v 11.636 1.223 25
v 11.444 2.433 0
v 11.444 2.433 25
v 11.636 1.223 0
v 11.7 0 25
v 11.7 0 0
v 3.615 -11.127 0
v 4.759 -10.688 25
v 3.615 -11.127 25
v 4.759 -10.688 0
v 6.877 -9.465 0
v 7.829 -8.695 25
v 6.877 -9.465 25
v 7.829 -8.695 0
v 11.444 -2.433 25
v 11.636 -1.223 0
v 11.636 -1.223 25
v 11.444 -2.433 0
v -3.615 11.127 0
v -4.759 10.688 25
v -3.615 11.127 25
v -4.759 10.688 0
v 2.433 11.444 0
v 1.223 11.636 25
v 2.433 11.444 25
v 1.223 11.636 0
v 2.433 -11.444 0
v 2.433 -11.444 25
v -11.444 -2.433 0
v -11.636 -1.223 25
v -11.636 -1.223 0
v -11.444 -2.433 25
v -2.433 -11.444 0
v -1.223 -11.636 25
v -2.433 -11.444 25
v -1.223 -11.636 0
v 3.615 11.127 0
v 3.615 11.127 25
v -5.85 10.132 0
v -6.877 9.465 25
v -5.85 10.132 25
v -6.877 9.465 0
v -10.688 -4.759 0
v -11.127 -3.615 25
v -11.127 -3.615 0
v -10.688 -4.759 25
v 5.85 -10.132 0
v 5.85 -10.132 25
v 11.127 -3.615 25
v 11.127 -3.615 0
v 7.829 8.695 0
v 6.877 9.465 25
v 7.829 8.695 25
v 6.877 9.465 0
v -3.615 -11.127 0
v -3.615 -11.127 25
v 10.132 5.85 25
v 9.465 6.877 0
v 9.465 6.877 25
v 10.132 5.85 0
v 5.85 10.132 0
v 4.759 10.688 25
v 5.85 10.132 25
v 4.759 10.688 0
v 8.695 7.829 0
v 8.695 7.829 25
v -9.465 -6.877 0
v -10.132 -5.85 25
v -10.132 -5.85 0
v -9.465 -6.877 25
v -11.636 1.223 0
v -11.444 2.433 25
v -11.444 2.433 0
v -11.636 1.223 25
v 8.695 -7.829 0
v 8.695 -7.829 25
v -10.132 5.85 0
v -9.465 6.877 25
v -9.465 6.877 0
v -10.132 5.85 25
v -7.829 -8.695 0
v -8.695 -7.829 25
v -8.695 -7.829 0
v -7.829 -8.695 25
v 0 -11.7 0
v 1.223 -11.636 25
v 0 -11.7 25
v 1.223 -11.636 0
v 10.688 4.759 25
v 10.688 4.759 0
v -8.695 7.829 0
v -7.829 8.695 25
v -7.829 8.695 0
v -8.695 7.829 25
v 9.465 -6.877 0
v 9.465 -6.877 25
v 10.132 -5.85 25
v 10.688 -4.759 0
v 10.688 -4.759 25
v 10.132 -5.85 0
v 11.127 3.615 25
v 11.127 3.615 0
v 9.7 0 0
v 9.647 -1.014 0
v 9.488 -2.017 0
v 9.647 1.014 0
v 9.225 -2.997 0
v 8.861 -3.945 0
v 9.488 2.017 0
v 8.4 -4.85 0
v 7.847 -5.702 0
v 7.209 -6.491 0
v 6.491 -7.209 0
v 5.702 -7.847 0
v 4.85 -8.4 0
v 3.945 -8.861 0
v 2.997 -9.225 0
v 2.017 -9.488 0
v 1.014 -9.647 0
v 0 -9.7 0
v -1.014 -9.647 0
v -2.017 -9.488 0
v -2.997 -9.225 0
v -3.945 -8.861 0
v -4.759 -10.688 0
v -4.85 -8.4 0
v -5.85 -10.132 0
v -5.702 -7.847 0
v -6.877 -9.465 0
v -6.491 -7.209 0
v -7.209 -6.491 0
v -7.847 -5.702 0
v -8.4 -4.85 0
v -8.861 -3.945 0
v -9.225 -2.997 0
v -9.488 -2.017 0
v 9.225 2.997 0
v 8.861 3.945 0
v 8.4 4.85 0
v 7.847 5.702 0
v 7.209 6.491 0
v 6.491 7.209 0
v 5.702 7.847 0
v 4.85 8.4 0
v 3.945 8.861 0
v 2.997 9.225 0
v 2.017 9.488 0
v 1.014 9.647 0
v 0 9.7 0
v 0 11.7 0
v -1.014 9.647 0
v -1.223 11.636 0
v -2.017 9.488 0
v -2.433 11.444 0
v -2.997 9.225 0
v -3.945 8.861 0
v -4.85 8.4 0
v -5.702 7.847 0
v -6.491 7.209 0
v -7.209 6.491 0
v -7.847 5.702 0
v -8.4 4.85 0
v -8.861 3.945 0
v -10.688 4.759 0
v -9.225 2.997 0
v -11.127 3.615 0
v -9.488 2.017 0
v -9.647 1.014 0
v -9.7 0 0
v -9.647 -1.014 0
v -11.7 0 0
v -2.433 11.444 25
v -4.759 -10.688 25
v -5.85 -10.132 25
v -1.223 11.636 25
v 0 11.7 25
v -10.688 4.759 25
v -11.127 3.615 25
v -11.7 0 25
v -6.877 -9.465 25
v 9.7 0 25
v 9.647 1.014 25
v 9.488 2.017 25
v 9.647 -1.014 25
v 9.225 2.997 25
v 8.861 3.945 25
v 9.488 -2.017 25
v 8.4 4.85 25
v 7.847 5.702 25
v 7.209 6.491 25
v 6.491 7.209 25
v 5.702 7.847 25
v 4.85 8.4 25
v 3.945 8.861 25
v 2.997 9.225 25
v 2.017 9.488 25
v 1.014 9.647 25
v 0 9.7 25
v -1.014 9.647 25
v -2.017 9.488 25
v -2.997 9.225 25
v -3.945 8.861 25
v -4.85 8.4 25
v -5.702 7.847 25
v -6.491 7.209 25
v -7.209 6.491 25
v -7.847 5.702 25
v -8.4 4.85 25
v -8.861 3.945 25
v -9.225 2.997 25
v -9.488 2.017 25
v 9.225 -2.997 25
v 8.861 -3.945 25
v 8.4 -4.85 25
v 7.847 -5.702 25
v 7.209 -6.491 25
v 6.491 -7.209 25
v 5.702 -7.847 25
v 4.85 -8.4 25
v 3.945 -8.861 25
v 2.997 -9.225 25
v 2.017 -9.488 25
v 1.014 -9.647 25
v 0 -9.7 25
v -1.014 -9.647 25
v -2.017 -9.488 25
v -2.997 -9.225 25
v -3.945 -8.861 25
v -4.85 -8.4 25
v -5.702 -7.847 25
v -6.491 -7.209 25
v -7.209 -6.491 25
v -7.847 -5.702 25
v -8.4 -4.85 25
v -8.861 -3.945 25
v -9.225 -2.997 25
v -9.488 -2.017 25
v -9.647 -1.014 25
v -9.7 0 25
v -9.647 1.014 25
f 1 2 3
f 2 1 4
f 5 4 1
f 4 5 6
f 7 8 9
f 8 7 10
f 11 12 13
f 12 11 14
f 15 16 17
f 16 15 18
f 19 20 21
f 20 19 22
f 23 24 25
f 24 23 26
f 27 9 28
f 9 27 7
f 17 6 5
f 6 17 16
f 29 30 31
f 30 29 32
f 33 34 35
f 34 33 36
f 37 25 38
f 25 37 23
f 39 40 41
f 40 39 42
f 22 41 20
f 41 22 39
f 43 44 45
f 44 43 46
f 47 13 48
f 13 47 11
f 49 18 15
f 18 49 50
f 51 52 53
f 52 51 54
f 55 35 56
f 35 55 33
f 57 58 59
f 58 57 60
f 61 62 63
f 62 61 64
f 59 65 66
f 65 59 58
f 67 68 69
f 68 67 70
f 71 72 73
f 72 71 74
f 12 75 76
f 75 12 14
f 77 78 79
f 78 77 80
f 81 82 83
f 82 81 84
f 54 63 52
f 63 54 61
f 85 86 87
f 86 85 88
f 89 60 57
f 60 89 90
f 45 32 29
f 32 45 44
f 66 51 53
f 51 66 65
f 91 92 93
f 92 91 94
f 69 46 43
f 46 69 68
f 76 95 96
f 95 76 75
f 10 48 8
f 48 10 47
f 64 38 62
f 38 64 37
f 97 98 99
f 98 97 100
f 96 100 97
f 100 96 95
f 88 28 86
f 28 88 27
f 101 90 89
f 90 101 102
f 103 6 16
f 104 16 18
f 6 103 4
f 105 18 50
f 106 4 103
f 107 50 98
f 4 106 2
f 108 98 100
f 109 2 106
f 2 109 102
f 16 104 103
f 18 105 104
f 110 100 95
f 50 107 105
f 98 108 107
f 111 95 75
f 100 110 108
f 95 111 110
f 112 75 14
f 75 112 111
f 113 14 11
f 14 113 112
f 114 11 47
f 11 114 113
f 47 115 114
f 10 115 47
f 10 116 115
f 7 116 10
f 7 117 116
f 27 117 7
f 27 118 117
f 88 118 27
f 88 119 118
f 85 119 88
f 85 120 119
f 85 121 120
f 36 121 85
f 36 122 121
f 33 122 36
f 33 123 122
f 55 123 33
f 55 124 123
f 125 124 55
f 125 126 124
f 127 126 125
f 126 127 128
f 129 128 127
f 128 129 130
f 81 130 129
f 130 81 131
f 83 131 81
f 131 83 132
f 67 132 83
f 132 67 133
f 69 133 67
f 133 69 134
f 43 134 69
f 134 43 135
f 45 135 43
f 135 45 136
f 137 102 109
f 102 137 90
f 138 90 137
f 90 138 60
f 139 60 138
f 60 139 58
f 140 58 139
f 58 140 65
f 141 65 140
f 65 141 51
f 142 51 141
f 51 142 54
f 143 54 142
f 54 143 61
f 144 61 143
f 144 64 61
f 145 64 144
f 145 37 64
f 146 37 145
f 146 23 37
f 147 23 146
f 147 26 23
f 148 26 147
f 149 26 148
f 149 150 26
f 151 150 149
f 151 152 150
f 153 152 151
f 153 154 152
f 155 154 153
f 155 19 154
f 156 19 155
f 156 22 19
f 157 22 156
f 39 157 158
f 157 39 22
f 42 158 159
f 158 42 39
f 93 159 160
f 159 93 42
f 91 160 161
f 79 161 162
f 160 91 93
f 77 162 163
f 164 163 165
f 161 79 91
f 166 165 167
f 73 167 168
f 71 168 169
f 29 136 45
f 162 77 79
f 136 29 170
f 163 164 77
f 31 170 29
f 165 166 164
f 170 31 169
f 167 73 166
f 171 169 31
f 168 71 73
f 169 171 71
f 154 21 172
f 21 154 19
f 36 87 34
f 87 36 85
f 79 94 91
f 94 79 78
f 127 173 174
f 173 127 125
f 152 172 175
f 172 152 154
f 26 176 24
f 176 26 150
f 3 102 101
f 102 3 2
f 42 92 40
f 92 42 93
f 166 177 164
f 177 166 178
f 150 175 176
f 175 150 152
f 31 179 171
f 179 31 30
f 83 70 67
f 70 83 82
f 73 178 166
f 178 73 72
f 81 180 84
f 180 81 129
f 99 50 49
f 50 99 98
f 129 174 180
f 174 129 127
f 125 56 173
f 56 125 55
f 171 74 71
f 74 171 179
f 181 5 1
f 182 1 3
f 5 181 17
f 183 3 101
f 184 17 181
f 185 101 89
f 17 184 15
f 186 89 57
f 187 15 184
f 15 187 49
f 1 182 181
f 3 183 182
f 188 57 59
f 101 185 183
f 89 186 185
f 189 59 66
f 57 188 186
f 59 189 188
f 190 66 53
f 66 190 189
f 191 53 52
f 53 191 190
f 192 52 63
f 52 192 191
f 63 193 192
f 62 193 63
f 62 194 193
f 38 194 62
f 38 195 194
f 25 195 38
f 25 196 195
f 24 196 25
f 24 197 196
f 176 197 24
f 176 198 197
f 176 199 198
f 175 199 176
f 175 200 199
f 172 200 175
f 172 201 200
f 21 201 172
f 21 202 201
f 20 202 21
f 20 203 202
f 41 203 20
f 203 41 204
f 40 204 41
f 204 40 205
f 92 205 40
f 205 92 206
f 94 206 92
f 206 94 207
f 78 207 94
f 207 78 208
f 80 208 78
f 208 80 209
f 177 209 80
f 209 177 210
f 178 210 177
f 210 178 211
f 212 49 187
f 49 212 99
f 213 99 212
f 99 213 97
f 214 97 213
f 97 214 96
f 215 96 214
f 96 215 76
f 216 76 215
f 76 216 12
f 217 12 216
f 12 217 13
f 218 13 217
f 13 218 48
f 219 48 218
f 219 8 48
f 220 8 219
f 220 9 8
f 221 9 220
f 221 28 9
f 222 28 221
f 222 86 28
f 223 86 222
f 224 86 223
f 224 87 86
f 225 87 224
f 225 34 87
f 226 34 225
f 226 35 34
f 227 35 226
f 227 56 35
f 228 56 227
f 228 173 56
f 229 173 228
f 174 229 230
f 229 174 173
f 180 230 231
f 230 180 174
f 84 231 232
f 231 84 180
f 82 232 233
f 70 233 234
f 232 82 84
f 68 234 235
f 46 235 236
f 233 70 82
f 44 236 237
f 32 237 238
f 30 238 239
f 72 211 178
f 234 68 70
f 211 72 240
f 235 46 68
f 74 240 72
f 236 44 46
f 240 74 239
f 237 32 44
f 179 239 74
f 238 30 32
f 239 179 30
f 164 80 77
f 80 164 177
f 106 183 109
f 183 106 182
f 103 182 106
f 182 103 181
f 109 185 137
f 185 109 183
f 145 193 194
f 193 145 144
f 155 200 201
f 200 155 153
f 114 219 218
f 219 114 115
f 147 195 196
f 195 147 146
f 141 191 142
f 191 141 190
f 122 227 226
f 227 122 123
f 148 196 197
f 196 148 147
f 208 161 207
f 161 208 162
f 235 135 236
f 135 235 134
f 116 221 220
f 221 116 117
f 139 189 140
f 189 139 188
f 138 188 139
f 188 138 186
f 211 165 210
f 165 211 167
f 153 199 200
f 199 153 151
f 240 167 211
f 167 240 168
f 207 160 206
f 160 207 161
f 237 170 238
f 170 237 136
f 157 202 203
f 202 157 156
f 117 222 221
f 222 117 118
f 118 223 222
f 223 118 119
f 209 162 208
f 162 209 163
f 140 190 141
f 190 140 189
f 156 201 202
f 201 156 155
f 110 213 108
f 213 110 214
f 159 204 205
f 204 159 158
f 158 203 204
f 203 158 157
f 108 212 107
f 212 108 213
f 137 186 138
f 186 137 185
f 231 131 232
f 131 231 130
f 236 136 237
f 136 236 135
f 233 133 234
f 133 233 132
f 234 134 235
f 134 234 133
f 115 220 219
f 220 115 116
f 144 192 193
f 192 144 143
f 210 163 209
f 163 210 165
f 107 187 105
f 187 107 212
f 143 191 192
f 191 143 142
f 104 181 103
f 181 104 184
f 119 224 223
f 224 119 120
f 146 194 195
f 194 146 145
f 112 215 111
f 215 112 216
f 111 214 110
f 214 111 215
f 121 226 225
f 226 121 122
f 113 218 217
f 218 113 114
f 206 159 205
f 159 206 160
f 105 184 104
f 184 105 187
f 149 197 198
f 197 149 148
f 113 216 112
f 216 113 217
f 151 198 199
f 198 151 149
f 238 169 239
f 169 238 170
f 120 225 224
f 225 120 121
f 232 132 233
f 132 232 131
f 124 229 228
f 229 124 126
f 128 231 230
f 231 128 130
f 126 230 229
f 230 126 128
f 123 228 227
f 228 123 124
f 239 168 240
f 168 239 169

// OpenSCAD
$fn=60;
//axle();
//knob();

//spool(20, 8, 3.3, 1);

//plate();
//pen_holder();
//pulley_clamp();
//carriage();
//plate_clamp();
//carriage2();
//pen_holder2();
pen_guide_extension();
//pen_guide_adaptor();

module carriage2() {
        disk_r = 55;
        disk_t = 2;
        disk_rim = 6;
        disk_spokes_w = 6;
        disk_spokes_n = 3;
        pen_guide_r = 9.7;
        pen_guide_t = 2;
        pen_guide_h = 20+disk_t;
        inner_disk_r = pen_guide_r+pen_guide_t+2;
        mount_w = 31;
        mount_l = 18;
        mount_dist = pen_guide_r+pen_guide_t+20;
        groove_depth = 0.6;
        groove_kerf = 2;
        groove_h = pen_guide_h*0.85;

        difference() {
                cylinder(r=disk_r, h=disk_t);
                cylinder(r=disk_r-disk_rim, h=disk_t);
        }

        difference() {
                union() {
                        for (i=[0:disk_spokes_n-1])
                                rotate([0, 0, i*360/disk_spokes_n])
                                        translate([0, (disk_r-disk_rim/2)/2, disk_t/2])
                                                cube([disk_spokes_w, disk_r-disk_rim/2, disk_t], center=true);
                        cylinder(r=inner_disk_r, h=disk_t);
                        cylinder(r=pen_guide_r+pen_guide_t,h=pen_guide_h);
                }
                union() {
                        cylinder(r=pen_guide_r, h=pen_guide_h);
                        translate([0, 0, groove_h]) difference() {
                                cylinder(r=pen_guide_r+pen_guide_t, h=groove_kerf, center=true);
                                cylinder(r=pen_guide_r+pen_guide_t-groove_depth, h=groove_kerf, center=true);
                        }
                }
        }
        
        translate([mount_w/2, mount_l+mount_dist, 0])
                rotate([0, 0, 180]) servo_mount();

}

module pen_guide_extension() {
	pen_guide_r = 9.7;
	pen_guide_t = 2;
	pen_guide_h = 25;
	
	difference() {
		cylinder(r=pen_guide_r+pen_guide_t, h=pen_guide_h);
		cylinder(r=pen_guide_r, h=pen_guide_h);
	}
}

module pen_guide_adaptor() {
	or = 9.4;
	ir = 6.4;
	length = 32;
	gap = 2;

	difference() {
		cylinder(r=or, h=length);
		union() {
			cylinder(r=ir, h=length);
			translate([1.05*(or-ir)/2+ir, 0, length/2])
				cube([1.1*(or-ir), gap, length], center=true);
		}
	}
}

module plate_clamp() {
	motor_screw_r = 2;
	motor_l = 9;
	thickness = 2;
	width = 15;
	depth = 21;
	length = 25;
	difference() {
		cube([thickness, motor_l, width]);
		translate([0.5*thickness, motor_l/2+1, width/2])
			rotate([0, 90, 0]) 
				cylinder(r=motor_screw_r, h=1.05*thickness, center=true);
	}
	translate([0, -motor_l, 0]) cube([thickness, motor_l, width]);
	cube([depth+thickness, thickness, width]);
	translate([depth+thickness, -length+thickness, 0]) cube([thickness, length, width]);
}

module carriage() {
	translate([9, 0, 1]) hash_grid(w=18, h=70, N=2, M=4, t=2);

	translate([-20, 0, 1]) hash_grid(w=40, h=70, N=1, M=2, t=2);

	translate([0, -38, 0]) servo_mount();	
	translate([0, 38, 0]) mirror([0, 1, 0]) servo_mount();

	translate([-40-4/2, -35+4/2, 2/2]) 
		difference() {
			cube([4, 4, 2], center=true);
			cylinder(r=1, h=2, center=true);
		}

	translate([-40-4/2, +35-4/2, 2/2]) 
		difference() {
			cube([4, 4, 2], center=true);
			cylinder(r=1, h=2, center=true);
		}

}

module hash_grid (w, h, N, M, t) {
        for (n=[0:N]) {
                translate([-(w-t)/2+(n/N)*(w-t), 0, 0]) cube([t, h, t], center=true);
        }
        for (m=[0:M]) {
                translate([0, -(h-t)/2+(m/M)*(h-t), 0]) cube([w, t, t], center=true);
        }
}

module servo_mount() {
	motor_w = 23;
	motor_t = 14;
	motor_l = 18;
	thickness = 2;
	post_t = 2;
	post_w = 4;
	post_hole_r = 0.9;

	cube([motor_w+2*post_w, motor_l, thickness]);
	for (i=[0:1]) {
		translate([i*(motor_w+post_w)+post_w/2, motor_l-thickness+thickness/2, thickness+motor_t/2]) {
			rotate([0, 0, i*180]) difference() {
				cube([post_w, thickness, motor_t], center=true);
				translate([post_w/80, 0, 0]) 
					rotate([90, 0, 0]) 
						cylinder(r=post_hole_r, h=thickness*1.05, center=true);
			}
 		}
	}
}

module pulley_clamp() {
	width = 21;
	length = 25;
	height = 20;
	thickness = 2;
	r1 = 2;
	r2 = 1;
	cube([thickness, length, height]);
	translate([width+thickness, 0, 0]) cube([thickness, length, height]);
	translate([0, -thickness, 0]) cube([width+2*thickness, thickness, height]);
	translate([-(r1-r2), length, r2]) torus(r1, r2);
}

module pen_holder() {
	pen_r = 8.7;
	thickness = 2.5;
	height = 20;	
	lever_h = 6;
	lever_l = 25;
	lever_t = 2;

	tab_t = 1;
	tab_l = 5;
	gap = 2;

	difference() {
		union() {
			cylinder(r=pen_r+thickness, h=height);
			translate([(gap+lever_t)/2, pen_r*1.1+lever_l/2, lever_h/2])
				cube([lever_t, lever_l+thickness, lever_h], center=true);
			translate([0, pen_r+(tab_l+thickness)/2, height/2]) 
				cube([tab_t*2+gap, tab_l+thickness, height], center=true);
		}
		union() {
			cylinder(r=pen_r, h=height);
			translate([0, pen_r+0.5*(thickness+tab_l), height/2])
				cube([gap, 1.2*(thickness+tab_l), height], center=true);
		}
	}
}

module pen_holder2() {
        pen_r = 5.8;
        thickness = 2.5;
        height = 16;
        gap = 2;
        tab_length = 5;
        tab_depth= 5;
        tab_height = 5;
        tab_thickness = 2;
        tab_hole_r = 1;

        difference() {
                cylinder(r=pen_r+thickness, h=height);
                union() {
                        cylinder(r=pen_r, h=height);
                        translate([0, pen_r+0.5*(thickness), height/2])
                                cube([gap, 1.2*(thickness), height], center=true);
                }
        }
        
        translate([tab_thickness/2+gap/2, tab_depth/2+pen_r+thickness, tab_height/2])
                cube([tab_thickness, tab_depth*1.2, tab_height], center=true);

        translate([-(tab_length-gap)/2, tab_thickness/2+pen_r+thickness+tab_depth, tab_height/2])
                difference() {
                        translate([tab_thickness/2, 0, 0])
                                cube([tab_length+tab_thickness, tab_thickness, tab_height], center=true);
                        rotate([90, 0, 0])
                                cylinder(r=tab_hole_r, h=tab_thickness*1.05, center=true);
                }
}

module plate () {
	knob_dist = 72.7;

	motor_screw_dist = 35;
	motor_screw_offset = 8;
	motor_axle_hole = 9.5;
	motor_screw_r = 2.5;

	plate_d = 1.5;
	plate_h = motor_screw_dist+10;
	plate_l = knob_dist+2*15;

	frame_thickness = 4;
	
	difference() { 
		cube([plate_l, plate_h, plate_d], center=true);
		union() {
			for (i=[0:1]) {
				rotate([0, 0, i*180]) {
					translate([-knob_dist/2, 0, 0]) 
						cylinder(r=motor_axle_hole/2, h=plate_d, center=true);
					translate([-knob_dist/2-motor_screw_offset, motor_screw_dist/2, 0])
						cylinder(r=motor_screw_r, h=plate_d, center=true);
					translate([-knob_dist/2-motor_screw_offset, -motor_screw_dist/2, 0])
						cylinder(r=motor_screw_r, h=plate_d, center=true);
				}
			}
			cube([knob_dist-motor_axle_hole-2*frame_thickness, plate_h-2*frame_thickness, plate_d], center=true);
		}
	}
}	


module spool(radius, height, rim_dr, rim_h) {
	difference() {
		cylinder(r=radius+1*rim_dr+0*(height/2-rim_h), h=height);
		union() {
			axle();
			translate([0, 0, 2])	difference() {
				cylinder(r=0.8*radius, h=height-2);
				cylinder(r=0.2*radius, h=height-2);
			}
			translate([0, 0, height/2]) torus(radius+(height/2-rim_h), height/2-rim_h);
//			translate([0, 0, rim_h]) difference() {
//				cylinder(r=radius+rim_dr, h=height-2*rim_h);
//				cylinder(r=radius+(height/2-rim_h), h=height-2*rim_//h);
//			}
			for (i=[0:5]) {
				rotate([0, 0, i*360/6])
					translate([radius/1.85, 0, 0]) cylinder(r=radius/4.4, h=height);
			}
		}		
	}
}

module knob () {
	knob_r1 = 10.45;
	knob_r2 = 10.6;
	knob_t = 2;
	knob_h1 = 9;
	knob_h2 = 5;

	difference() { 
		cylinder(r=knob_r1+knob_t, h=knob_h1+knob_h2);
		union() { 
			axle();
			translate([0, 0, knob_h2]) cylinder(r1=knob_r1, r2=knob_r2, h=knob_h1);
		}
	}
}

module axle () {
	stepper_axle_r = 2.5;
	stepper_axle_d = 3;
	stepper_axle_l = 10;
	eps = 0.2;

	intersection() { 
		cylinder(r=stepper_axle_r+eps, h=stepper_axle_l);
		translate([0, 0, stepper_axle_l/2])
			cube([stepper_axle_d+2*eps, 2*(stepper_axle_r+eps), stepper_axle_l], center=true);
	}
}

module torus (Radius, radius) {
	rotate_extrude() {
		translate([Radius, 0, 0]) union() {
			circle($fn=4, r=radius, center=true);
			translate([radius,0,0]) square(center=true, [radius*2, radius*2]);
		}
	}
}
